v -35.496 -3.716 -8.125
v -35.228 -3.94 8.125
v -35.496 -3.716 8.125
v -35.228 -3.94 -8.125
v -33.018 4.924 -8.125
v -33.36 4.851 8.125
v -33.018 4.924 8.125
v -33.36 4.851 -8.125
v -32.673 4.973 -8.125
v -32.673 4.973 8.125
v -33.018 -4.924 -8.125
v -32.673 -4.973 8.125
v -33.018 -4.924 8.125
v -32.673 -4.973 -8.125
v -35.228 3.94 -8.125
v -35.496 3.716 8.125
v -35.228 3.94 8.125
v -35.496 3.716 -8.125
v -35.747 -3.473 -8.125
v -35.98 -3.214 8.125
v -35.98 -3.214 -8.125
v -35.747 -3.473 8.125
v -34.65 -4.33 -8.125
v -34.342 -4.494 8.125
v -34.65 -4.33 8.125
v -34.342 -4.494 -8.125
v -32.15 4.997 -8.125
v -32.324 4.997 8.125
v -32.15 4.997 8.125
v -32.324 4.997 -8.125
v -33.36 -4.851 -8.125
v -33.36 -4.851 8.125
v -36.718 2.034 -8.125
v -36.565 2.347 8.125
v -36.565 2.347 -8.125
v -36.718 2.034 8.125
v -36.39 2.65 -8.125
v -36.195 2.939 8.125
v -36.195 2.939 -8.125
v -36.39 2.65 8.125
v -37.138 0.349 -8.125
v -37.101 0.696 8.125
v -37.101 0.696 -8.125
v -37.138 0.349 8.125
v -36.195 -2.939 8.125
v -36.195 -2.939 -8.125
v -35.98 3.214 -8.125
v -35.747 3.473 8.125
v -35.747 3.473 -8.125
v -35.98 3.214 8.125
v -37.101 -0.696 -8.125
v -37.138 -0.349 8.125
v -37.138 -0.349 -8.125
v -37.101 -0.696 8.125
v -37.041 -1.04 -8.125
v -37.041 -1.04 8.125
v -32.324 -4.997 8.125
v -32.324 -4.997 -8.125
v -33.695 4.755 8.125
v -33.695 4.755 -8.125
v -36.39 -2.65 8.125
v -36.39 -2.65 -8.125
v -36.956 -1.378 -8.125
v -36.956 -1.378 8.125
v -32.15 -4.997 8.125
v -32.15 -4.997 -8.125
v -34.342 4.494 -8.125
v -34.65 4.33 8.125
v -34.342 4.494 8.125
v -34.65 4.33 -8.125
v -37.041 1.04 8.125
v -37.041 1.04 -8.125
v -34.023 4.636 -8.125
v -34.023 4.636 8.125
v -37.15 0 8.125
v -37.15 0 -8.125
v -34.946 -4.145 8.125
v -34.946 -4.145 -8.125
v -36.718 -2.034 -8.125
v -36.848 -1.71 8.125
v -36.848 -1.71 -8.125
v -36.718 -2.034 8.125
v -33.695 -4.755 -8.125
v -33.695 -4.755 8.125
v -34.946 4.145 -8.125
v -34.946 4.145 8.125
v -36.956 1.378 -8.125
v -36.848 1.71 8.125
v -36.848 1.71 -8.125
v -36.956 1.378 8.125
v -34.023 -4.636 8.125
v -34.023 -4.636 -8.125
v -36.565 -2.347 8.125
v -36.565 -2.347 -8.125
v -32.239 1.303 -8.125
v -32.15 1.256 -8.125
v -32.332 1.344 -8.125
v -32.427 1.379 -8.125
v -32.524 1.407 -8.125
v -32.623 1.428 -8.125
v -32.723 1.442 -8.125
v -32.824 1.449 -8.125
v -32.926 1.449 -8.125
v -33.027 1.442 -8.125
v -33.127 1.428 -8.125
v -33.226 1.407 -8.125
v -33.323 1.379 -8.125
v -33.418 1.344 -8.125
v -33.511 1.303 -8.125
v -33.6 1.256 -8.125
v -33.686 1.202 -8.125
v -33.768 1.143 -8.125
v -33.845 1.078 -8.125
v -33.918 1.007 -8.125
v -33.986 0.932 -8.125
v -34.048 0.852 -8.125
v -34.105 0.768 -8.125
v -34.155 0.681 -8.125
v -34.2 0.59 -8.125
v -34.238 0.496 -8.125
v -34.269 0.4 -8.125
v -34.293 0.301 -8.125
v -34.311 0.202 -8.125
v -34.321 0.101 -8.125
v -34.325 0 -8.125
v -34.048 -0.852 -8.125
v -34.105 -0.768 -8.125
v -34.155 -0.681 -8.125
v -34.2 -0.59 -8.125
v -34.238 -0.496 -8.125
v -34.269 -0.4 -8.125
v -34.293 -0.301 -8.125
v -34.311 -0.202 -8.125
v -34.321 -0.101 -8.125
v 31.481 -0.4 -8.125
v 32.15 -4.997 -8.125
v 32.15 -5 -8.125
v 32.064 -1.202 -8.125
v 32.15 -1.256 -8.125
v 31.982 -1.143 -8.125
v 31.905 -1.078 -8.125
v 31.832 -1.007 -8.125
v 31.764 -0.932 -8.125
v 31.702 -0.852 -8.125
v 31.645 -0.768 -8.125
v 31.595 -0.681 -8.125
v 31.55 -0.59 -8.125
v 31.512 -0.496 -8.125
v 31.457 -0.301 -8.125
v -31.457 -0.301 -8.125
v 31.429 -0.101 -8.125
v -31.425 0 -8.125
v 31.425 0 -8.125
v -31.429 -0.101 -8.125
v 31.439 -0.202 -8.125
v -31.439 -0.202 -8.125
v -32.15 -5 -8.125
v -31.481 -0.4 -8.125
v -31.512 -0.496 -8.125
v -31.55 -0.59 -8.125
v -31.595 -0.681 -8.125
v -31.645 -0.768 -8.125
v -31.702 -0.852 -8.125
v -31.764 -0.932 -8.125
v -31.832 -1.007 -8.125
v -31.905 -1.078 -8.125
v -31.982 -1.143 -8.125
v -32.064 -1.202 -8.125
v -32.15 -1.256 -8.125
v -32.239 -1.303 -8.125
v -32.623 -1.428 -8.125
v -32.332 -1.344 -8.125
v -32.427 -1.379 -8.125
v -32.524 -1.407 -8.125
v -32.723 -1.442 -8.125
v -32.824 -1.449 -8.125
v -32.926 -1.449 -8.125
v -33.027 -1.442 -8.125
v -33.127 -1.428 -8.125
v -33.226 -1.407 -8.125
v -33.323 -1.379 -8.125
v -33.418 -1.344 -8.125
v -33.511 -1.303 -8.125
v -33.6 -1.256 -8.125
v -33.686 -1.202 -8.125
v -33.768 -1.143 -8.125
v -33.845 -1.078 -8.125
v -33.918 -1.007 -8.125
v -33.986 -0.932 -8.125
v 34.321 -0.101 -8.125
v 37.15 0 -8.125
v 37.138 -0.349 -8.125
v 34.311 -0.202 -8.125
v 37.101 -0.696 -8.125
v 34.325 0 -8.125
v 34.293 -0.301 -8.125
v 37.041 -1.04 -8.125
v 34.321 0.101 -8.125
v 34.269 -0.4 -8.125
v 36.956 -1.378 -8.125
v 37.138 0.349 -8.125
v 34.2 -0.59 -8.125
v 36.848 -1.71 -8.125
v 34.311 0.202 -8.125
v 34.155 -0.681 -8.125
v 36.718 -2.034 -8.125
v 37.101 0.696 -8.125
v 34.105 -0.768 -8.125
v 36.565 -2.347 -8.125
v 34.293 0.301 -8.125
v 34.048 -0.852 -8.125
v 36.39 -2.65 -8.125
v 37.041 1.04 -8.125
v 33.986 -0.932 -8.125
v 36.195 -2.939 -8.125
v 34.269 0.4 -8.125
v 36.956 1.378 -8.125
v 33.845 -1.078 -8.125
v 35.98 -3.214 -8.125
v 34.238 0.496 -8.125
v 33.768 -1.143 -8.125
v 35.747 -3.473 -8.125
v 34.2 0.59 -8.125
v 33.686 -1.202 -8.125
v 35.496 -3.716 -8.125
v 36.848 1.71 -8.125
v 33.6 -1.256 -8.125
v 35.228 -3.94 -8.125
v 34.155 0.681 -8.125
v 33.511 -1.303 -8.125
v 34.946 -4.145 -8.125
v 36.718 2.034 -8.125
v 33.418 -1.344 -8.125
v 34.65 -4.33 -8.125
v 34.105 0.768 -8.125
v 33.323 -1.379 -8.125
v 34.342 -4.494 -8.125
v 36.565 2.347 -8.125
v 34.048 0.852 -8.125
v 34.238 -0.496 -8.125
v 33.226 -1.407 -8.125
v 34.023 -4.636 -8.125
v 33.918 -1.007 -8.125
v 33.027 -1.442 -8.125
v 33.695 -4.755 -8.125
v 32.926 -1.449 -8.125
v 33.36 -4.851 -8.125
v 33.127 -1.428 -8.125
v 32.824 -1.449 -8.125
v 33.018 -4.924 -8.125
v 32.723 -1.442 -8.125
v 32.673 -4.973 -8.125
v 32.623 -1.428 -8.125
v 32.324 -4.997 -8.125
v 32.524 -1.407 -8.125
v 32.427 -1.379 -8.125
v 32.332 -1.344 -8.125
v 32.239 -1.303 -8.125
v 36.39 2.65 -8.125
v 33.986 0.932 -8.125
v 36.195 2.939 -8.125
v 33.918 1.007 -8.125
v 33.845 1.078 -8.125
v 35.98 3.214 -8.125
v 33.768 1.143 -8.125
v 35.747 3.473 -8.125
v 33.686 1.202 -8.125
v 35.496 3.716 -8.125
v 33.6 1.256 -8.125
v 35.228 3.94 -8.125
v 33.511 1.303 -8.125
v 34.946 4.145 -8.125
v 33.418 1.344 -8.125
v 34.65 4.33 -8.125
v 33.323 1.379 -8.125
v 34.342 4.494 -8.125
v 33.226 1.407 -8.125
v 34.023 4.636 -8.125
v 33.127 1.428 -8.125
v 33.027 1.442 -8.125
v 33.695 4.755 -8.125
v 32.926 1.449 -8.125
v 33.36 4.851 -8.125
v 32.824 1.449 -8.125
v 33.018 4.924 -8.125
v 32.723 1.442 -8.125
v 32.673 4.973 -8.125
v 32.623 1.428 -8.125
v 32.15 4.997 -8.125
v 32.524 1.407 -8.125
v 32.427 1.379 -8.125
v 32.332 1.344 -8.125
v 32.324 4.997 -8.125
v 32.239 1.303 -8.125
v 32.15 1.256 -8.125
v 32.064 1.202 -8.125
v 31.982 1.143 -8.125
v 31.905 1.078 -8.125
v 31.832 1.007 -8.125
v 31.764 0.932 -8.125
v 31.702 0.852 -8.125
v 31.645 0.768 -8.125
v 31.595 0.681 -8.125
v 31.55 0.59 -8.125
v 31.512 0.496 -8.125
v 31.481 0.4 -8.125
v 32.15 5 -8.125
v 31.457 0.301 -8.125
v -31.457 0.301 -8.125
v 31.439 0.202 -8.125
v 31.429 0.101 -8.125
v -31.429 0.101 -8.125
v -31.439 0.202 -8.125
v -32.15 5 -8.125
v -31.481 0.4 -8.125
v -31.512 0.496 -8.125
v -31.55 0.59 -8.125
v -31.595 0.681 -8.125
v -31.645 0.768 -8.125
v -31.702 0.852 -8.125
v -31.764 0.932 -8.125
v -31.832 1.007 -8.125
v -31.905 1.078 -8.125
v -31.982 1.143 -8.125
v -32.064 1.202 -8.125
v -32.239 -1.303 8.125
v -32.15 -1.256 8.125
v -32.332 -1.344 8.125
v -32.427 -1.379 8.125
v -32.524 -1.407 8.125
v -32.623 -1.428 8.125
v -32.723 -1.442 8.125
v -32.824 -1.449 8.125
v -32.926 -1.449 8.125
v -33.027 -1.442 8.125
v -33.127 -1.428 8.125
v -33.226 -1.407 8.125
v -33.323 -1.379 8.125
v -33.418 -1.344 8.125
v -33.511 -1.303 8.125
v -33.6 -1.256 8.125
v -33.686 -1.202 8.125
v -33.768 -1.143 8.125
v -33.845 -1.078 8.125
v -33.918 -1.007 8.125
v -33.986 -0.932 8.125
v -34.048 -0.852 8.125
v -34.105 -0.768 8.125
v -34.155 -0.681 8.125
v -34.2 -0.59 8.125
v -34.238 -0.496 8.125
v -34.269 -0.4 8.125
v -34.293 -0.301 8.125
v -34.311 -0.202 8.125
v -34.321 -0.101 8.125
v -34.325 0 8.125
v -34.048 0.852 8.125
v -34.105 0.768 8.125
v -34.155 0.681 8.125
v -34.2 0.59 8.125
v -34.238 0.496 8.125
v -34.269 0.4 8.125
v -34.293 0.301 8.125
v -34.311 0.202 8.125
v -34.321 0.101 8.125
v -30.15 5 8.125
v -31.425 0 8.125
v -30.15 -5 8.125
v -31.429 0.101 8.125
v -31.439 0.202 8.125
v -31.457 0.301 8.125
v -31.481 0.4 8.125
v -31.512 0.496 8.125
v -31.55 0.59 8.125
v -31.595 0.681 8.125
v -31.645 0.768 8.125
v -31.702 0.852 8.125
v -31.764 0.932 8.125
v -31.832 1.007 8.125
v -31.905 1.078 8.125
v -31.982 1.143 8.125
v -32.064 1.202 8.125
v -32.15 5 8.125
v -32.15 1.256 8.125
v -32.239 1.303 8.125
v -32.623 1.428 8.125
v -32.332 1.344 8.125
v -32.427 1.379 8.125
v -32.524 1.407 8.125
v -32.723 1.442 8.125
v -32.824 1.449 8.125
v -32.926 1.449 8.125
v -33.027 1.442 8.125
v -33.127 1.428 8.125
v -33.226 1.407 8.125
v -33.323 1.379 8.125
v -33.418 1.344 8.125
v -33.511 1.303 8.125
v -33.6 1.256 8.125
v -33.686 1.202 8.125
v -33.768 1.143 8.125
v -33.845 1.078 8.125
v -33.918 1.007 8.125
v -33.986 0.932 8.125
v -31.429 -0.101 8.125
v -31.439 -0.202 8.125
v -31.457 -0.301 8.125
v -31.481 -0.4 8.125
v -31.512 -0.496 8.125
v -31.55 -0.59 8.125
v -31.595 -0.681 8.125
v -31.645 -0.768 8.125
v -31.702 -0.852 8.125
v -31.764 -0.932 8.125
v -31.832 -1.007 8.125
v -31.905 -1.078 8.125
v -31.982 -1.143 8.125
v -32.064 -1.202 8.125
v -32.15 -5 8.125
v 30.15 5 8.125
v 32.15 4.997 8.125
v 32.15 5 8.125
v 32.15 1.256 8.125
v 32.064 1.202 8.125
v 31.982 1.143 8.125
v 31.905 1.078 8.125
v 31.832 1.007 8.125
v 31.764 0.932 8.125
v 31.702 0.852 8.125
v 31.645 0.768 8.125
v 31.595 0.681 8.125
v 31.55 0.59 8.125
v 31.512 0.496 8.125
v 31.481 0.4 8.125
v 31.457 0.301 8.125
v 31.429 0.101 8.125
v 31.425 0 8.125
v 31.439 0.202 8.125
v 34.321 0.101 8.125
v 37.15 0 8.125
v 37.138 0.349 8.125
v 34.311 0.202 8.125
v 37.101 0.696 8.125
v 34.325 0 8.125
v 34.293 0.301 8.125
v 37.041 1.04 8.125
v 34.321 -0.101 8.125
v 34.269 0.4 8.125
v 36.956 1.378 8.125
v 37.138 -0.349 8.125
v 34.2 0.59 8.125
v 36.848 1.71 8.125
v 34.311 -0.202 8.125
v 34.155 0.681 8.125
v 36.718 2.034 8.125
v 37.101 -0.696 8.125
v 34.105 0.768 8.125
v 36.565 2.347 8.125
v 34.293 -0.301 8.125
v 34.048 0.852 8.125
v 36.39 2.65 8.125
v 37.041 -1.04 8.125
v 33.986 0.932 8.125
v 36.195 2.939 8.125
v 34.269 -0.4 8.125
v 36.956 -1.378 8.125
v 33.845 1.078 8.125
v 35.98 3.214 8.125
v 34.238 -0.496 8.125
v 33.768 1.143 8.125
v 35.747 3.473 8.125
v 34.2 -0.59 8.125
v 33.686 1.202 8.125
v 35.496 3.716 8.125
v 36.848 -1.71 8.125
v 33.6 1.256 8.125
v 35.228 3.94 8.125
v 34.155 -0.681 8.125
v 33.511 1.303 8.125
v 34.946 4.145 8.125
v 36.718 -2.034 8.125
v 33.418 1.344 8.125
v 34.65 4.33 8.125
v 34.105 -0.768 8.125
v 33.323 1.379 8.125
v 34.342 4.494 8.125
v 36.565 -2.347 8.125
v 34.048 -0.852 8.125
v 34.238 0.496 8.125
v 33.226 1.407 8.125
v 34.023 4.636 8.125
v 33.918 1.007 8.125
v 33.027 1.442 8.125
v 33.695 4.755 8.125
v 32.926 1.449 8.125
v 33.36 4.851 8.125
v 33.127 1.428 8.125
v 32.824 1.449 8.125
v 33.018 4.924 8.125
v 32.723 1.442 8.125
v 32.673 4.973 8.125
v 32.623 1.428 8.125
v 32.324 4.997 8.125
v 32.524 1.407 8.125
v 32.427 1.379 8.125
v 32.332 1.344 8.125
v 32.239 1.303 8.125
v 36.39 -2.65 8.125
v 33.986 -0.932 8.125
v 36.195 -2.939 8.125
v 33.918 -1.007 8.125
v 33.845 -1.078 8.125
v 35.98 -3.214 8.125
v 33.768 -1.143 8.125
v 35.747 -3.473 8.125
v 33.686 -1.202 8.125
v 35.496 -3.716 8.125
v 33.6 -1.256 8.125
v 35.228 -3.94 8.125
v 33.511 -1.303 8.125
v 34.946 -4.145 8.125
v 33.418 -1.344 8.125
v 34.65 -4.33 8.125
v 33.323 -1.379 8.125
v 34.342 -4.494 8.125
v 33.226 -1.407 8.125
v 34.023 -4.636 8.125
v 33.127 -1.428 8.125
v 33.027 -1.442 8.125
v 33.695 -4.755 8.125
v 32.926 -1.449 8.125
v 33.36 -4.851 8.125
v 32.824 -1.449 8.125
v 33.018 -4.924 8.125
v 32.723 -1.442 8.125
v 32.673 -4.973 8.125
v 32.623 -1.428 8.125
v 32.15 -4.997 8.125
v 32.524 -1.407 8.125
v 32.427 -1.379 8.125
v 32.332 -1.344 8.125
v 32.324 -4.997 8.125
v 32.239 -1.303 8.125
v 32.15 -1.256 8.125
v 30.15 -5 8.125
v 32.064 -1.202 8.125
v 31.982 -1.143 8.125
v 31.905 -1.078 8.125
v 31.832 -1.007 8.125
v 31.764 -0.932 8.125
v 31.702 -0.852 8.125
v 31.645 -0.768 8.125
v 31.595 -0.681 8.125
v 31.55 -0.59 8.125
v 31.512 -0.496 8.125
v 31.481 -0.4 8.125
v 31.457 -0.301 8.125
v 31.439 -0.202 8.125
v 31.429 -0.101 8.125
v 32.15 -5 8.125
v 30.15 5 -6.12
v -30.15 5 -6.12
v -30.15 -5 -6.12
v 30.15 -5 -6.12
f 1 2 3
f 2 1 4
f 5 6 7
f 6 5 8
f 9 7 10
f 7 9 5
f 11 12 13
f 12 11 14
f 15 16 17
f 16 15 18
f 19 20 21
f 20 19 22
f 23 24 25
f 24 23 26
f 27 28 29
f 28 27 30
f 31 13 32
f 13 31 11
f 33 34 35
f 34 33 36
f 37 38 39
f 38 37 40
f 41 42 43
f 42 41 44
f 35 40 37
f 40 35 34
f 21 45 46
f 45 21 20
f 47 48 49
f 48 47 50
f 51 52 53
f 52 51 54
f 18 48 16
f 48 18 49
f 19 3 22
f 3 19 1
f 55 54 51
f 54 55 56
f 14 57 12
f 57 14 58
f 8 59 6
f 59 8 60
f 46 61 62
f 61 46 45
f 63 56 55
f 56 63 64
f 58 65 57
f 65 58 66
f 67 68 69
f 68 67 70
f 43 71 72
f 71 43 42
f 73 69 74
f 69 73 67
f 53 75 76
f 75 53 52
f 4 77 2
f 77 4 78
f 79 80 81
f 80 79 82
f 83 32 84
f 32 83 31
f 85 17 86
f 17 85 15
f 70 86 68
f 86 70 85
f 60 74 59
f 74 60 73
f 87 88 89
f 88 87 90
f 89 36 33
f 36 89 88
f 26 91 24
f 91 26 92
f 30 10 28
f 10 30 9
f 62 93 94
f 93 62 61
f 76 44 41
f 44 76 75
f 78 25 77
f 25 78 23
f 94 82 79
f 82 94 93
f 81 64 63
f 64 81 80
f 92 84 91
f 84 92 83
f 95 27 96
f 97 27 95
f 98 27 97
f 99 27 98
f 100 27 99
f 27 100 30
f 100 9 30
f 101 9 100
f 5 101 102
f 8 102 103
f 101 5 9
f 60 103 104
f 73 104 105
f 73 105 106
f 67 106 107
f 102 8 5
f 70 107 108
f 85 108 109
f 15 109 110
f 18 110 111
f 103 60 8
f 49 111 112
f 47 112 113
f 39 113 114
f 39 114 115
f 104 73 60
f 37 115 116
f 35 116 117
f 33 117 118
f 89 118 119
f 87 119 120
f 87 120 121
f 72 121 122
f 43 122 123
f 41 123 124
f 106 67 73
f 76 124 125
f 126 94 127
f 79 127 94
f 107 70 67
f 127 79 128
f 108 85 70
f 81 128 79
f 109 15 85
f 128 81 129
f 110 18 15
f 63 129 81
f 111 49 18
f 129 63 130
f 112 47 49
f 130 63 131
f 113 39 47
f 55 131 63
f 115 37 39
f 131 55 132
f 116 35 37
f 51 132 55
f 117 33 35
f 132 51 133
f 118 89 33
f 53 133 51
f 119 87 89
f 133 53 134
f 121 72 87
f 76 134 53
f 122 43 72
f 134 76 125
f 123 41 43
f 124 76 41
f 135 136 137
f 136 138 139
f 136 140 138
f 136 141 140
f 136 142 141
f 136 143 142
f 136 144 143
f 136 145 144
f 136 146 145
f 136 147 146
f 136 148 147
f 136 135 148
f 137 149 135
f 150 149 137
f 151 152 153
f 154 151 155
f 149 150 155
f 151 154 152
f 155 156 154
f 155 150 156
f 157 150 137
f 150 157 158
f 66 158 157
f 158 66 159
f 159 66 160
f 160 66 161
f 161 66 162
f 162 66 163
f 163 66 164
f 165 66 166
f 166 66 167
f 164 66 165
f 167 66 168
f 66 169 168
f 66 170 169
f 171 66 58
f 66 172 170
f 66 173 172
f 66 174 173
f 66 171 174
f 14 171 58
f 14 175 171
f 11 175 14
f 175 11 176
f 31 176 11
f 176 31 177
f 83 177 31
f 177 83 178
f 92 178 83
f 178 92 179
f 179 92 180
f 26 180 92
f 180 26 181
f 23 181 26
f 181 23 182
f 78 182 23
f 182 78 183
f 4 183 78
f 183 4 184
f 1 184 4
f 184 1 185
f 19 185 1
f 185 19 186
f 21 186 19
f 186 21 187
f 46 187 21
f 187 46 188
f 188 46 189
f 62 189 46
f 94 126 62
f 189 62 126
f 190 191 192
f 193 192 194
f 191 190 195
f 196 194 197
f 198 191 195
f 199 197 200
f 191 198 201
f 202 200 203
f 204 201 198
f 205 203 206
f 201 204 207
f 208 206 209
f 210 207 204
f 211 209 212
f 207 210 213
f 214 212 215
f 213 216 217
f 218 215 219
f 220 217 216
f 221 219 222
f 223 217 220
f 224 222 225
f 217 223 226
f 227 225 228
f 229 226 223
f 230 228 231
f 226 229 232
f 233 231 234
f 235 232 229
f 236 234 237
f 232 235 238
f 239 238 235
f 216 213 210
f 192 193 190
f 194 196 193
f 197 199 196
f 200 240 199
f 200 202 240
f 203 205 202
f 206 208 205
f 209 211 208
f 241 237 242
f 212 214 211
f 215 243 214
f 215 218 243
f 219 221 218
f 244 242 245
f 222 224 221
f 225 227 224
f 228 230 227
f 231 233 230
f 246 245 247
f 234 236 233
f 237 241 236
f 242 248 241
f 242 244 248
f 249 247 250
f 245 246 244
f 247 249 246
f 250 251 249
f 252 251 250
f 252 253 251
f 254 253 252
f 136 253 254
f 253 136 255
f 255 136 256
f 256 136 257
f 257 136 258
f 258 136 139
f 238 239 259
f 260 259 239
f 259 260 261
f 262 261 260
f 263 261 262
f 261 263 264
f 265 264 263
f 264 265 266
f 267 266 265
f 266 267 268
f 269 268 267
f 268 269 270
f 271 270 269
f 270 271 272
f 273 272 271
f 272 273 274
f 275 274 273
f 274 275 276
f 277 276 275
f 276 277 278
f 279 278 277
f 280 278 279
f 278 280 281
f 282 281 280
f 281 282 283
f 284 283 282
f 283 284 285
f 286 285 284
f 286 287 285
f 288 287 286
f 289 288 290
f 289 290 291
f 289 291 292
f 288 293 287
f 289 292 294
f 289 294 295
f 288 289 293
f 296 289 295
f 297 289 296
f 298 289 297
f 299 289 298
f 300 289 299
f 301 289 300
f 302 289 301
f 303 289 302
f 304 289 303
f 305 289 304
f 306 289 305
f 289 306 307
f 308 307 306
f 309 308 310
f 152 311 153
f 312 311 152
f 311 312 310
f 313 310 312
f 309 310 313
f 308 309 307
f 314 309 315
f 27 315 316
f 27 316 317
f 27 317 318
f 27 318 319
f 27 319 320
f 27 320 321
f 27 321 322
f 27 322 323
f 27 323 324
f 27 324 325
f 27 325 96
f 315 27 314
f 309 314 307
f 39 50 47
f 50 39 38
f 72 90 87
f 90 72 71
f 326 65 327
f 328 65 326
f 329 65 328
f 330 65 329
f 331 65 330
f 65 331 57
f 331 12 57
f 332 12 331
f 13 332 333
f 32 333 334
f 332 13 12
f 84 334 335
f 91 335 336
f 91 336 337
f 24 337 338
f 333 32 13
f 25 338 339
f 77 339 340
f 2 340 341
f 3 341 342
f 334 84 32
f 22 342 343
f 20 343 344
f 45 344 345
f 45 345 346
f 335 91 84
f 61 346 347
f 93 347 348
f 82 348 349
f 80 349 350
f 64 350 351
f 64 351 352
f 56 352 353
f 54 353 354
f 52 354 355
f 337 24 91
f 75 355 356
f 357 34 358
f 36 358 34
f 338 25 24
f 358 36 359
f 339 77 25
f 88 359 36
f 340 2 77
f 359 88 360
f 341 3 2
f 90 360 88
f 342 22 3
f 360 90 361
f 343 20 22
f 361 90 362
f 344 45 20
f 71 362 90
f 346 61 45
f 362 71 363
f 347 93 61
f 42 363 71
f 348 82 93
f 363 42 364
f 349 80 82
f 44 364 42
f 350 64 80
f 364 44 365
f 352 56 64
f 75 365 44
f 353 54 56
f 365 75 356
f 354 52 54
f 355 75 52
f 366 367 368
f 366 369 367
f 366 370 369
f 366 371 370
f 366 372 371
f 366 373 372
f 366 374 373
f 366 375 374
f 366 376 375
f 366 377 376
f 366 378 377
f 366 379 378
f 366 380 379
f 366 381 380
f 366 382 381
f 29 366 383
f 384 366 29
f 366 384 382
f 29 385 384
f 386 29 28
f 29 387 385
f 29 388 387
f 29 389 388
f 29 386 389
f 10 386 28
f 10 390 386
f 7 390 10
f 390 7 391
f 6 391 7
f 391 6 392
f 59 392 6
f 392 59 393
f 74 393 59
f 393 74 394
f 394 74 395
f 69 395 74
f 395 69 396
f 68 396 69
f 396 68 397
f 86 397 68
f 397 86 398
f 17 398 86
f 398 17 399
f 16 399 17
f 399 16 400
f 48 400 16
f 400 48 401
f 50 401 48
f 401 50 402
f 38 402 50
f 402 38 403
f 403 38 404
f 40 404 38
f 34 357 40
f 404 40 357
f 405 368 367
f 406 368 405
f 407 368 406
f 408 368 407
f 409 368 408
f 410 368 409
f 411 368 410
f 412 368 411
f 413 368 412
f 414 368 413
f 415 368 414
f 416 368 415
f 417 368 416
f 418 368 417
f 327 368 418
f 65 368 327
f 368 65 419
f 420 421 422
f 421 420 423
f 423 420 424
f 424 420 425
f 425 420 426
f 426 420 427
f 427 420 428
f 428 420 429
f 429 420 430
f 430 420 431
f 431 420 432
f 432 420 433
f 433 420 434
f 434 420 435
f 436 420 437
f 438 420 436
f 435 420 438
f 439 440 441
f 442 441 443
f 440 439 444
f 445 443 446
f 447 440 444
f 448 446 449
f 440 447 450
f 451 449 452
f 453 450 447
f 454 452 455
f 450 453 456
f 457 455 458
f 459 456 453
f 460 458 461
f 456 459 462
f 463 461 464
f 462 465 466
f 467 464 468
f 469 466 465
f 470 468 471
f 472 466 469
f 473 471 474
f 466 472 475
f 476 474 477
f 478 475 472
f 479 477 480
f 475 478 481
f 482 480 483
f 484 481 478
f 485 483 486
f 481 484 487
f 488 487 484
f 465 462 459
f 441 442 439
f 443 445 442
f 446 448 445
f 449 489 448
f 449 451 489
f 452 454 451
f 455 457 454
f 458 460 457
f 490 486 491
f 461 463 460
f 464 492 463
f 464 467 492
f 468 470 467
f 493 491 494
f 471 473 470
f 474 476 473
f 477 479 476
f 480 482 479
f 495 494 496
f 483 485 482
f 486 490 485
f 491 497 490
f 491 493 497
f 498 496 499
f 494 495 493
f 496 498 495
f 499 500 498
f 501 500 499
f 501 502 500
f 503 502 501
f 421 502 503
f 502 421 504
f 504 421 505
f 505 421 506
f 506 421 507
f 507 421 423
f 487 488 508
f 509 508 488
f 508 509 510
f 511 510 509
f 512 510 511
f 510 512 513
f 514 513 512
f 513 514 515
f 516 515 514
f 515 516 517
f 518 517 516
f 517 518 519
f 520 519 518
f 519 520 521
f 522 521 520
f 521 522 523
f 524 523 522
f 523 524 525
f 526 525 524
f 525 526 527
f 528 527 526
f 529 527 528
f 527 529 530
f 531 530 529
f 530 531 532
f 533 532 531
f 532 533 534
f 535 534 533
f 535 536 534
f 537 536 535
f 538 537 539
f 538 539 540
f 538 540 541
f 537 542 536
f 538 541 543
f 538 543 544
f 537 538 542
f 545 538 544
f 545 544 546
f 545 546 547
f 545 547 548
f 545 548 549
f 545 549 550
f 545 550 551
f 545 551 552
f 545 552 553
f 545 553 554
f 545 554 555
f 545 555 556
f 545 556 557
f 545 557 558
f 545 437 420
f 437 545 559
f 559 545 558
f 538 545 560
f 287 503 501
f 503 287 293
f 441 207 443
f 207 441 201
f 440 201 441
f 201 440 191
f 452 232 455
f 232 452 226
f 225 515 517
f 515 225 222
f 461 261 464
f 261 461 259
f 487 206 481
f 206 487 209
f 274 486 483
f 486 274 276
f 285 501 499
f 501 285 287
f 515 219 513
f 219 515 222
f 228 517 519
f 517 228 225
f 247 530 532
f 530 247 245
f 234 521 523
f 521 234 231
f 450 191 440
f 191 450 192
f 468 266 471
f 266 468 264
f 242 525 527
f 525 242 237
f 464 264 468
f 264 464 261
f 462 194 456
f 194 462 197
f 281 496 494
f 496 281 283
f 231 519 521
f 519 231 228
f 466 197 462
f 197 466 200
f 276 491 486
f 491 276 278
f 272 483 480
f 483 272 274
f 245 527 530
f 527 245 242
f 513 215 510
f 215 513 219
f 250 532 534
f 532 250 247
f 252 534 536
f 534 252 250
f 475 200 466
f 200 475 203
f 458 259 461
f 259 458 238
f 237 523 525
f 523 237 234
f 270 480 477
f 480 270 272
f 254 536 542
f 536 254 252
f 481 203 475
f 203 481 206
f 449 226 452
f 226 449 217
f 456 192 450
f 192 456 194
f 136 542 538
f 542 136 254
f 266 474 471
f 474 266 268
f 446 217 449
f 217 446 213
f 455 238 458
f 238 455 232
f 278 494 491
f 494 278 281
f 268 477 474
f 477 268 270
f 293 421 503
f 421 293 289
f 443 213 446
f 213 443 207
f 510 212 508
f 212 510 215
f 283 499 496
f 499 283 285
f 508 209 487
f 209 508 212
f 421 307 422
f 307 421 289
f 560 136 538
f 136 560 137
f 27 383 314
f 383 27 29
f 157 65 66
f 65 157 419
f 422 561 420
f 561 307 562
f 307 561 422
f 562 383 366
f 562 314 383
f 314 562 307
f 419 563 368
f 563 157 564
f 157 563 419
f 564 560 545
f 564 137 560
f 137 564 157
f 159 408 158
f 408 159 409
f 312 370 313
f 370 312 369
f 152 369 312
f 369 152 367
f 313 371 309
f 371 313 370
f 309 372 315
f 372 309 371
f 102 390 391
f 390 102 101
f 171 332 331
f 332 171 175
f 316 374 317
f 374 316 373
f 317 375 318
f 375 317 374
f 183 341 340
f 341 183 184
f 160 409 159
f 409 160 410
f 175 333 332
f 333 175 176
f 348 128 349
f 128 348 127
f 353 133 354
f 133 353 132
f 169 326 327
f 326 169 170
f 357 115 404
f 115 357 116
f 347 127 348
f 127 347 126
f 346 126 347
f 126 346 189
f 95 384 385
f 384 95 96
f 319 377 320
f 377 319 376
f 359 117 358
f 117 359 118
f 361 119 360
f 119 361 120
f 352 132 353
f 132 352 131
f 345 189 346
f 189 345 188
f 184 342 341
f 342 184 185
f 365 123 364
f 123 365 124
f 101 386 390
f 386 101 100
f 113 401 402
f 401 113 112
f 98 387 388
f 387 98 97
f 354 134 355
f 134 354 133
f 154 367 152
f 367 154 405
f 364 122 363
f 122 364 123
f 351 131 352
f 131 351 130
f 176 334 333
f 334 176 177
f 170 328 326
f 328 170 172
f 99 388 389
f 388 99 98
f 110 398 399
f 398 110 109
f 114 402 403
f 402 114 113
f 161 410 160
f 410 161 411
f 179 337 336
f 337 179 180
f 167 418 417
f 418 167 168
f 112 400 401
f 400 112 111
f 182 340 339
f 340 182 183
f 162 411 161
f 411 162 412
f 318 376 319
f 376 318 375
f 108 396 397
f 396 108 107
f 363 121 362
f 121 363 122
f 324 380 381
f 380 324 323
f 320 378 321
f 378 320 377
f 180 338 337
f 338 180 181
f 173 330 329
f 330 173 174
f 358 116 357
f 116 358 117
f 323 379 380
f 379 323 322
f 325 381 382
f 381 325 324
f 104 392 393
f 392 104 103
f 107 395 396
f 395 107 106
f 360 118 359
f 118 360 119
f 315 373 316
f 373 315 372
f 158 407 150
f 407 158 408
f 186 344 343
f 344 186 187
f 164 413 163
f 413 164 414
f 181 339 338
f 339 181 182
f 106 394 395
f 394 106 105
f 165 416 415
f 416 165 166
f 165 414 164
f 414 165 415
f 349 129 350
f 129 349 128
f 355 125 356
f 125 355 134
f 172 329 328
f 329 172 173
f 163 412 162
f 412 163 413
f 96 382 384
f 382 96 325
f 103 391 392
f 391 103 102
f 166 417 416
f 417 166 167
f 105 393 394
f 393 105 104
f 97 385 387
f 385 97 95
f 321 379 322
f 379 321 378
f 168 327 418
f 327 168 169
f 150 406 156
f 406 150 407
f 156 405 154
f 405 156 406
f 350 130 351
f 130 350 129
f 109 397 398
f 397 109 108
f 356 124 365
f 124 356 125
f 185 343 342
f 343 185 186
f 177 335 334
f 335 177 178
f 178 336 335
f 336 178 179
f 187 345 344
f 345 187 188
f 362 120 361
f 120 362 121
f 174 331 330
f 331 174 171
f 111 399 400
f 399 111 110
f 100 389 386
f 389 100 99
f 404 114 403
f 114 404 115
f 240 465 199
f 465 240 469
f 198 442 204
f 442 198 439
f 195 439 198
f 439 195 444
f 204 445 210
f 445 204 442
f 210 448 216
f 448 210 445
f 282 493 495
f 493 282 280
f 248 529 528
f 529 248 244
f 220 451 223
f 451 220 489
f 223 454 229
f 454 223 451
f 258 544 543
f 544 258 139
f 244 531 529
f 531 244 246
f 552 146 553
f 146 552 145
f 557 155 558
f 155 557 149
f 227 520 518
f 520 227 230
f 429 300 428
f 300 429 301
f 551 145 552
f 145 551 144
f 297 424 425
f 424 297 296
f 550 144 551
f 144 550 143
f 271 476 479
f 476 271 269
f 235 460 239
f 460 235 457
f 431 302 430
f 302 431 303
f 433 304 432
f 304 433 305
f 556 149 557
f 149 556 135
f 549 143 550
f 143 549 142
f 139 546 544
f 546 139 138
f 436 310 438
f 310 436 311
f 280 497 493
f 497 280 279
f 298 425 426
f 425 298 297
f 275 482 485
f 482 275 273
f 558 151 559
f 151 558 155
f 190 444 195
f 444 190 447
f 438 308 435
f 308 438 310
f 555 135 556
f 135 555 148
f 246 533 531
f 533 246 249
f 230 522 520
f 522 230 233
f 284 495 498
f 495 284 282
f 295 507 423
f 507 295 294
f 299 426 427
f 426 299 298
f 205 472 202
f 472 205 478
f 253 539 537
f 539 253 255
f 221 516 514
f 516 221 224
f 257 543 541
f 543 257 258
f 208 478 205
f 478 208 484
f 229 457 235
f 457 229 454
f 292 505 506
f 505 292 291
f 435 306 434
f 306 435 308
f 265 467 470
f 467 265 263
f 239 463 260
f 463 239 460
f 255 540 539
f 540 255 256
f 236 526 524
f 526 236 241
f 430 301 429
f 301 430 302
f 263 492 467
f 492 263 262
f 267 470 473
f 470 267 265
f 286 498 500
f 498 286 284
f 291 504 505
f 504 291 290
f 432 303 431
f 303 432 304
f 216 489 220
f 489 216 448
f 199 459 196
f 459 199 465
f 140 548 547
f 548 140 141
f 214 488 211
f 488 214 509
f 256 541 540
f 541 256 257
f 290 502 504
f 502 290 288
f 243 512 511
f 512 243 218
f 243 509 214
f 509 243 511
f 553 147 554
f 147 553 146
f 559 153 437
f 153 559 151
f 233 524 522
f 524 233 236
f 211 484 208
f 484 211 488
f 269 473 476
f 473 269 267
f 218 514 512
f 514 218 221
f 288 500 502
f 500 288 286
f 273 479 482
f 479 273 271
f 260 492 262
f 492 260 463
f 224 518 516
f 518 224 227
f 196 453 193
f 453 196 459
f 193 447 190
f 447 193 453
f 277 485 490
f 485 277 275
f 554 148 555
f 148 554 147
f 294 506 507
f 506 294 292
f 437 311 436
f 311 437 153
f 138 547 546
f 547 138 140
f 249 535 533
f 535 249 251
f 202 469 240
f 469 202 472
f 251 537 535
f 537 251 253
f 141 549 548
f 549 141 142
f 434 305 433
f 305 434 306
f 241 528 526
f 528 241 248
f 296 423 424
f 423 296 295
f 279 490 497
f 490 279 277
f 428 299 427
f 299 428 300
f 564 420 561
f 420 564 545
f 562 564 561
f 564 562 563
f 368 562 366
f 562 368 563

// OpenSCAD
// file: ../modules/breakPart.scad
module rotFromTo(di,do)
    if( norm(di-do)==0 || norm(di)==0 || norm(do)==0 )
        children();
    else
        mirror(do/norm(do)+di/norm(di)) mirror(di) children(); 

module breakPart(normal = [0, 0, 0], shift=0, pinLocs = [[0, 0]], pinType = 0) {
  // First child is the part itself, second child is the pin
  //   - The pin should be centered in x and y and into the positive z direction
  // normal: Vector normal to the plane of breaking
  // shift: How far from the origin to move the center of the plane
  // pinOffset: Offset for pin (hole -> wider, pin -> narrower)
  // pinType: [0: attached (M), 1: F]
  _BIG = 250;

  difference() {
    children(0);
    rotFromTo([0, 0, 1], normal) translate([0, 0, shift]) {
      difference() {
        cylinder(r = _BIG/2, h = _BIG);
        if (pinType == 0) for (loc = pinLocs) {
          translate(concat(loc, [shift - eps])) {
            children(1);
          }
        }
      }
      if (pinType == 1) for (loc = pinLocs) {
        mirror([0, 0, 1]) translate(concat(loc, [shift - eps])) {
          children(1);
        }
      }
    } 
  }

}
// file: ../_constants.scad
$fa=4 + 0; // default minimum facet angle is now 0.5
$fs=0.1 + 0; // default minimum facet size is now 0.05 mm
eps = .005 + 0;

defaultFont = "Bitstream Vera Sans Mono:style=Bold";

include <modules/breakPart.scad>;
// main file
include <../_constants.scad>

part = 2; // [0: Lid, 1: Body, 2: Extractor Bracket, 3: Split Lid, 4: Lid Spacer]

// base
componentSpacing = 5 * 1;
panelThickness = 2 * 1;

boxDimensions = [120, 100, 25] * 1;
totalHeight = boxDimensions.z - panelThickness;

legThickness = 8 * 1;
legAddedHeight = 40 * 1;
legAngle = 30 * 1;

speakerWireHole = 3 * 1;

// M3 Screw
m3_threadRad = 1.45 * 1;
m3_headRad = 3 * 1;

// speaker
sp_holeSpacing = (41.5 + 37.8) / 2;
sp_screwRad = 2 / 2;

// audio extracto
as_dimensions = [60.3, 52.4, 14.25] * 1;

// power supply
ps_tabSize = 7 * 1;
ps_dimensions = [53, 49.7 + ps_tabSize * 2, 19.9] * 1;

// audio board
ab_knobShaftRad = 7.05 / 2;
ab_knobHoleHeight = 11.2 * 1;
ab_dimensions = [55.7, 32.3, 15] * 1;

// type A
a_holeDim = [13.3, 6, 15] * 1;

// type C
c_holeDim = [3.4, 1.3, 9.2, 1] * 1;
c_portLen = 7.3 * 1;
c_boardDim = [5, 12, 11] * 1;
c_c2c = c_holeDim.z - c_holeDim.x;

usb_edgeGap = 5 * 1;

usb_totalWidth = 40 * 1;
usb_totalHeight = totalHeight;
module usbPanel(hole=false) {

  difference() {
    cube([usb_totalWidth, a_holeDim.y - eps*2, usb_totalHeight]);
    if(!hole) {
      translate([usb_edgeGap, -eps, usb_totalHeight / 2 - a_holeDim.z/2]) cube(a_holeDim);
      translate([usb_totalWidth - usb_edgeGap - c_holeDim.x/2, c_portLen - eps, usb_totalHeight / 2]) {
        translate([0, -c_portLen + c_boardDim.y/2 + c_holeDim.y, 0]) cube(c_boardDim, center = true);
        rotate([90, 0, 0]) linear_extrude(c_portLen) offset(c_holeDim[3]) square([c_holeDim.x - c_holeDim[3] * 2, c_holeDim.z - c_holeDim[3]*2], center=true);
      }
    }
  }
}


module volumePanel() {
  difference() {
    cube([ab_dimensions.x, panelThickness, totalHeight]);
    translate([ab_dimensions.x/2, panelThickness+eps, ab_knobHoleHeight]) rotate([90, 0, 0]) cylinder(r = ab_knobShaftRad, h = panelThickness + eps*2);
  }
}

module componentSpacer(xPos) {
  translate([xPos - eps, 0, 0]) {
    cube([componentSpacing + eps*2, panelThickness, totalHeight]);
  }
}

panelWidth = ab_dimensions.x + componentSpacing + usb_totalWidth;
module frontPanel() {
  translate([ab_dimensions.x + componentSpacing - panelWidth/2, 0, 0]) {
    usbPanel();
    componentSpacer(-componentSpacing);
    translate([-ab_dimensions.x - componentSpacing, 0, 0]) volumePanel();
  }
}

module mainBox() {
  translate([0, boxDimensions.y/2, 0]) {
    translate([0, 0, boxDimensions.z/2 -panelThickness]) difference() { 
      cube(boxDimensions, center=true);
      translate([0, 0, panelThickness]) cube([boxDimensions.x - panelThickness*2, boxDimensions.y-panelThickness*2, boxDimensions.z], center=true);
      translate([0, -panelThickness-eps, panelThickness]) cube([panelWidth-eps*2, boxDimensions.y, boxDimensions.z], center=true);
      for(ix = [-1, 1] * (as_dimensions.x + panelThickness*2 + m3_threadRad)/2) translate([ix, 0, 0]) {
        cylinder(r = m3_threadRad, h=boxDimensions.z*2, center=true);
        translate([0, boxDimensions.y/4, 0]) cylinder(r = speakerWireHole, h=boxDimensions.z*2, center=true);
      }
    }
    for(ix = [-1, 1] * (boxDimensions.x/2 - panelThickness -m3_threadRad)) for(iy = [-1, 1] * (boxDimensions.y/4 - panelThickness -m3_threadRad)) translate([ix, iy, 0]) difference() {
      cylinder(r = m3_threadRad*2, h=boxDimensions.z-panelThickness);
      cylinder(r = m3_threadRad, h=boxDimensions.z);
    }

  }
}

module lid(legs = true, holes = true) {
  difference() {
    union() {
      for (im = [0, 1]) mirror([im, 0, 0]) translate([boxDimensions.x/2, -boxDimensions.y/4, 0]) {
        if(legs) rotate([0, legAngle, 0]) difference() {
          cube([legThickness, boxDimensions.y/2, boxDimensions.z + legAddedHeight*1.5]);
          for(iy = [-1, 1]*sp_holeSpacing/2) for(iz = [-1, 1]*sp_holeSpacing/2) translate([-legThickness/2, boxDimensions.y/4 + iy, boxDimensions.z/2 + legAddedHeight/2+ iz]) rotate([0, 90, 0]) cylinder(r = sp_screwRad, h=legThickness * 2);

          // TEMPORARY
          // #rotate([0, -legAngle, 0]) translate([-boxDimensions.x, -boxDimensions.y, boxDimensions.z + legAddedHeight]) cube(boxDimensions*2);
          // TEMPORARY
        }
        if (legs) intersection() {
          translate([0, boxDimensions.y/2, 0]) rotate([90, 0, 0]) cylinder(r = legThickness, h=boxDimensions.y/2);
          translate([0, 0, -50 + panelThickness]) cube([100, 100, 100], center = true);
        }
        // for(iy = [-1, 1] * (boxDimensions.y/4)) translate([0, boxDimensions.y/4 + iy, -panelThickness]) cylinder(r=legThickness, h=panelThickness*2);
      }
      cube([boxDimensions.x, boxDimensions.y, panelThickness*2], center=true);
    }
    for(ix = [-1, 1] * (boxDimensions.x/2 - panelThickness -m3_threadRad))  {
      if (holes) translate([ix * .75, 0, 0]) cylinder(r = speakerWireHole, h = panelThickness*3, center=true);
      for(iy = [-1, 1] * (boxDimensions.y/4 - panelThickness -m3_threadRad)) translate([ix, iy, 0]) {
        cylinder(r = m3_threadRad, h=boxDimensions.z, center=true);
        // translate([0, 0, -panelThickness/2 - eps]) cylinder(r = m3_headRad, h = panelThickness+eps, center=true);
      }
    }
    translate([-boxDimensions.x, -boxDimensions.y, boxDimensions.z + legAddedHeight]) cube(boxDimensions*2);
    translate([-boxDimensions.x, -boxDimensions.y, -boxDimensions.z*2 - panelThickness]) cube(boxDimensions*2);
  }
}


bracketWidth = 10;

module extractorBracket() {
  difference() {
    union() {
      cube([as_dimensions.x + panelThickness*2, bracketWidth, as_dimensions.z + panelThickness], center = true);
      for(ix = [-1, 1] * (as_dimensions.x + panelThickness*2)/2) translate([ix, 0, -(as_dimensions.z+panelThickness)/2]) cylinder(r = bracketWidth/2, h = as_dimensions.z + panelThickness);
    }
    translate([0, 0, panelThickness/2 + eps]) cube(as_dimensions, center = true);

    for(ix = [-1, 1] * (as_dimensions.x + panelThickness*2 + m3_threadRad)/2) translate([ix, 0, 0]) {
      cylinder(r = m3_threadRad, h=as_dimensions.z + panelThickness + eps*2, center=true);
      // translate([0, 0, -panelThickness/2 - eps]) cylinder(r = m3_headRad, h=as_dimensions.z + eps, center=true);
    }
  }
}

if (part == 0) {
  lid();
} else if (part == 1) {
  mainBox();
  frontPanel();
} else if (part == 2) {
  extractorBracket();
} else if (part == 3) {
  intersection() {
    lid();
    translate([0, boxDimensions.y/4 + speakerWireHole, 0]) cube([boxDimensions.x*2, boxDimensions.y/2, 200], center=true);
  }
} else if (part == 4) {
  // difference() {
  //   lid(false);
  //   translate([0, boxDimensions.y * (3/12), 0]) cube([boxDimensions.x * (5/6), boxDimensions.y / 3, 50], center=true);
  //   translate([0, boxDimensions.y * (-3/12), 0]) cube([boxDimensions.x * (5/6), boxDimensions.y / 3, 50], center=true);
  // }
  lid(false, false);
} 
